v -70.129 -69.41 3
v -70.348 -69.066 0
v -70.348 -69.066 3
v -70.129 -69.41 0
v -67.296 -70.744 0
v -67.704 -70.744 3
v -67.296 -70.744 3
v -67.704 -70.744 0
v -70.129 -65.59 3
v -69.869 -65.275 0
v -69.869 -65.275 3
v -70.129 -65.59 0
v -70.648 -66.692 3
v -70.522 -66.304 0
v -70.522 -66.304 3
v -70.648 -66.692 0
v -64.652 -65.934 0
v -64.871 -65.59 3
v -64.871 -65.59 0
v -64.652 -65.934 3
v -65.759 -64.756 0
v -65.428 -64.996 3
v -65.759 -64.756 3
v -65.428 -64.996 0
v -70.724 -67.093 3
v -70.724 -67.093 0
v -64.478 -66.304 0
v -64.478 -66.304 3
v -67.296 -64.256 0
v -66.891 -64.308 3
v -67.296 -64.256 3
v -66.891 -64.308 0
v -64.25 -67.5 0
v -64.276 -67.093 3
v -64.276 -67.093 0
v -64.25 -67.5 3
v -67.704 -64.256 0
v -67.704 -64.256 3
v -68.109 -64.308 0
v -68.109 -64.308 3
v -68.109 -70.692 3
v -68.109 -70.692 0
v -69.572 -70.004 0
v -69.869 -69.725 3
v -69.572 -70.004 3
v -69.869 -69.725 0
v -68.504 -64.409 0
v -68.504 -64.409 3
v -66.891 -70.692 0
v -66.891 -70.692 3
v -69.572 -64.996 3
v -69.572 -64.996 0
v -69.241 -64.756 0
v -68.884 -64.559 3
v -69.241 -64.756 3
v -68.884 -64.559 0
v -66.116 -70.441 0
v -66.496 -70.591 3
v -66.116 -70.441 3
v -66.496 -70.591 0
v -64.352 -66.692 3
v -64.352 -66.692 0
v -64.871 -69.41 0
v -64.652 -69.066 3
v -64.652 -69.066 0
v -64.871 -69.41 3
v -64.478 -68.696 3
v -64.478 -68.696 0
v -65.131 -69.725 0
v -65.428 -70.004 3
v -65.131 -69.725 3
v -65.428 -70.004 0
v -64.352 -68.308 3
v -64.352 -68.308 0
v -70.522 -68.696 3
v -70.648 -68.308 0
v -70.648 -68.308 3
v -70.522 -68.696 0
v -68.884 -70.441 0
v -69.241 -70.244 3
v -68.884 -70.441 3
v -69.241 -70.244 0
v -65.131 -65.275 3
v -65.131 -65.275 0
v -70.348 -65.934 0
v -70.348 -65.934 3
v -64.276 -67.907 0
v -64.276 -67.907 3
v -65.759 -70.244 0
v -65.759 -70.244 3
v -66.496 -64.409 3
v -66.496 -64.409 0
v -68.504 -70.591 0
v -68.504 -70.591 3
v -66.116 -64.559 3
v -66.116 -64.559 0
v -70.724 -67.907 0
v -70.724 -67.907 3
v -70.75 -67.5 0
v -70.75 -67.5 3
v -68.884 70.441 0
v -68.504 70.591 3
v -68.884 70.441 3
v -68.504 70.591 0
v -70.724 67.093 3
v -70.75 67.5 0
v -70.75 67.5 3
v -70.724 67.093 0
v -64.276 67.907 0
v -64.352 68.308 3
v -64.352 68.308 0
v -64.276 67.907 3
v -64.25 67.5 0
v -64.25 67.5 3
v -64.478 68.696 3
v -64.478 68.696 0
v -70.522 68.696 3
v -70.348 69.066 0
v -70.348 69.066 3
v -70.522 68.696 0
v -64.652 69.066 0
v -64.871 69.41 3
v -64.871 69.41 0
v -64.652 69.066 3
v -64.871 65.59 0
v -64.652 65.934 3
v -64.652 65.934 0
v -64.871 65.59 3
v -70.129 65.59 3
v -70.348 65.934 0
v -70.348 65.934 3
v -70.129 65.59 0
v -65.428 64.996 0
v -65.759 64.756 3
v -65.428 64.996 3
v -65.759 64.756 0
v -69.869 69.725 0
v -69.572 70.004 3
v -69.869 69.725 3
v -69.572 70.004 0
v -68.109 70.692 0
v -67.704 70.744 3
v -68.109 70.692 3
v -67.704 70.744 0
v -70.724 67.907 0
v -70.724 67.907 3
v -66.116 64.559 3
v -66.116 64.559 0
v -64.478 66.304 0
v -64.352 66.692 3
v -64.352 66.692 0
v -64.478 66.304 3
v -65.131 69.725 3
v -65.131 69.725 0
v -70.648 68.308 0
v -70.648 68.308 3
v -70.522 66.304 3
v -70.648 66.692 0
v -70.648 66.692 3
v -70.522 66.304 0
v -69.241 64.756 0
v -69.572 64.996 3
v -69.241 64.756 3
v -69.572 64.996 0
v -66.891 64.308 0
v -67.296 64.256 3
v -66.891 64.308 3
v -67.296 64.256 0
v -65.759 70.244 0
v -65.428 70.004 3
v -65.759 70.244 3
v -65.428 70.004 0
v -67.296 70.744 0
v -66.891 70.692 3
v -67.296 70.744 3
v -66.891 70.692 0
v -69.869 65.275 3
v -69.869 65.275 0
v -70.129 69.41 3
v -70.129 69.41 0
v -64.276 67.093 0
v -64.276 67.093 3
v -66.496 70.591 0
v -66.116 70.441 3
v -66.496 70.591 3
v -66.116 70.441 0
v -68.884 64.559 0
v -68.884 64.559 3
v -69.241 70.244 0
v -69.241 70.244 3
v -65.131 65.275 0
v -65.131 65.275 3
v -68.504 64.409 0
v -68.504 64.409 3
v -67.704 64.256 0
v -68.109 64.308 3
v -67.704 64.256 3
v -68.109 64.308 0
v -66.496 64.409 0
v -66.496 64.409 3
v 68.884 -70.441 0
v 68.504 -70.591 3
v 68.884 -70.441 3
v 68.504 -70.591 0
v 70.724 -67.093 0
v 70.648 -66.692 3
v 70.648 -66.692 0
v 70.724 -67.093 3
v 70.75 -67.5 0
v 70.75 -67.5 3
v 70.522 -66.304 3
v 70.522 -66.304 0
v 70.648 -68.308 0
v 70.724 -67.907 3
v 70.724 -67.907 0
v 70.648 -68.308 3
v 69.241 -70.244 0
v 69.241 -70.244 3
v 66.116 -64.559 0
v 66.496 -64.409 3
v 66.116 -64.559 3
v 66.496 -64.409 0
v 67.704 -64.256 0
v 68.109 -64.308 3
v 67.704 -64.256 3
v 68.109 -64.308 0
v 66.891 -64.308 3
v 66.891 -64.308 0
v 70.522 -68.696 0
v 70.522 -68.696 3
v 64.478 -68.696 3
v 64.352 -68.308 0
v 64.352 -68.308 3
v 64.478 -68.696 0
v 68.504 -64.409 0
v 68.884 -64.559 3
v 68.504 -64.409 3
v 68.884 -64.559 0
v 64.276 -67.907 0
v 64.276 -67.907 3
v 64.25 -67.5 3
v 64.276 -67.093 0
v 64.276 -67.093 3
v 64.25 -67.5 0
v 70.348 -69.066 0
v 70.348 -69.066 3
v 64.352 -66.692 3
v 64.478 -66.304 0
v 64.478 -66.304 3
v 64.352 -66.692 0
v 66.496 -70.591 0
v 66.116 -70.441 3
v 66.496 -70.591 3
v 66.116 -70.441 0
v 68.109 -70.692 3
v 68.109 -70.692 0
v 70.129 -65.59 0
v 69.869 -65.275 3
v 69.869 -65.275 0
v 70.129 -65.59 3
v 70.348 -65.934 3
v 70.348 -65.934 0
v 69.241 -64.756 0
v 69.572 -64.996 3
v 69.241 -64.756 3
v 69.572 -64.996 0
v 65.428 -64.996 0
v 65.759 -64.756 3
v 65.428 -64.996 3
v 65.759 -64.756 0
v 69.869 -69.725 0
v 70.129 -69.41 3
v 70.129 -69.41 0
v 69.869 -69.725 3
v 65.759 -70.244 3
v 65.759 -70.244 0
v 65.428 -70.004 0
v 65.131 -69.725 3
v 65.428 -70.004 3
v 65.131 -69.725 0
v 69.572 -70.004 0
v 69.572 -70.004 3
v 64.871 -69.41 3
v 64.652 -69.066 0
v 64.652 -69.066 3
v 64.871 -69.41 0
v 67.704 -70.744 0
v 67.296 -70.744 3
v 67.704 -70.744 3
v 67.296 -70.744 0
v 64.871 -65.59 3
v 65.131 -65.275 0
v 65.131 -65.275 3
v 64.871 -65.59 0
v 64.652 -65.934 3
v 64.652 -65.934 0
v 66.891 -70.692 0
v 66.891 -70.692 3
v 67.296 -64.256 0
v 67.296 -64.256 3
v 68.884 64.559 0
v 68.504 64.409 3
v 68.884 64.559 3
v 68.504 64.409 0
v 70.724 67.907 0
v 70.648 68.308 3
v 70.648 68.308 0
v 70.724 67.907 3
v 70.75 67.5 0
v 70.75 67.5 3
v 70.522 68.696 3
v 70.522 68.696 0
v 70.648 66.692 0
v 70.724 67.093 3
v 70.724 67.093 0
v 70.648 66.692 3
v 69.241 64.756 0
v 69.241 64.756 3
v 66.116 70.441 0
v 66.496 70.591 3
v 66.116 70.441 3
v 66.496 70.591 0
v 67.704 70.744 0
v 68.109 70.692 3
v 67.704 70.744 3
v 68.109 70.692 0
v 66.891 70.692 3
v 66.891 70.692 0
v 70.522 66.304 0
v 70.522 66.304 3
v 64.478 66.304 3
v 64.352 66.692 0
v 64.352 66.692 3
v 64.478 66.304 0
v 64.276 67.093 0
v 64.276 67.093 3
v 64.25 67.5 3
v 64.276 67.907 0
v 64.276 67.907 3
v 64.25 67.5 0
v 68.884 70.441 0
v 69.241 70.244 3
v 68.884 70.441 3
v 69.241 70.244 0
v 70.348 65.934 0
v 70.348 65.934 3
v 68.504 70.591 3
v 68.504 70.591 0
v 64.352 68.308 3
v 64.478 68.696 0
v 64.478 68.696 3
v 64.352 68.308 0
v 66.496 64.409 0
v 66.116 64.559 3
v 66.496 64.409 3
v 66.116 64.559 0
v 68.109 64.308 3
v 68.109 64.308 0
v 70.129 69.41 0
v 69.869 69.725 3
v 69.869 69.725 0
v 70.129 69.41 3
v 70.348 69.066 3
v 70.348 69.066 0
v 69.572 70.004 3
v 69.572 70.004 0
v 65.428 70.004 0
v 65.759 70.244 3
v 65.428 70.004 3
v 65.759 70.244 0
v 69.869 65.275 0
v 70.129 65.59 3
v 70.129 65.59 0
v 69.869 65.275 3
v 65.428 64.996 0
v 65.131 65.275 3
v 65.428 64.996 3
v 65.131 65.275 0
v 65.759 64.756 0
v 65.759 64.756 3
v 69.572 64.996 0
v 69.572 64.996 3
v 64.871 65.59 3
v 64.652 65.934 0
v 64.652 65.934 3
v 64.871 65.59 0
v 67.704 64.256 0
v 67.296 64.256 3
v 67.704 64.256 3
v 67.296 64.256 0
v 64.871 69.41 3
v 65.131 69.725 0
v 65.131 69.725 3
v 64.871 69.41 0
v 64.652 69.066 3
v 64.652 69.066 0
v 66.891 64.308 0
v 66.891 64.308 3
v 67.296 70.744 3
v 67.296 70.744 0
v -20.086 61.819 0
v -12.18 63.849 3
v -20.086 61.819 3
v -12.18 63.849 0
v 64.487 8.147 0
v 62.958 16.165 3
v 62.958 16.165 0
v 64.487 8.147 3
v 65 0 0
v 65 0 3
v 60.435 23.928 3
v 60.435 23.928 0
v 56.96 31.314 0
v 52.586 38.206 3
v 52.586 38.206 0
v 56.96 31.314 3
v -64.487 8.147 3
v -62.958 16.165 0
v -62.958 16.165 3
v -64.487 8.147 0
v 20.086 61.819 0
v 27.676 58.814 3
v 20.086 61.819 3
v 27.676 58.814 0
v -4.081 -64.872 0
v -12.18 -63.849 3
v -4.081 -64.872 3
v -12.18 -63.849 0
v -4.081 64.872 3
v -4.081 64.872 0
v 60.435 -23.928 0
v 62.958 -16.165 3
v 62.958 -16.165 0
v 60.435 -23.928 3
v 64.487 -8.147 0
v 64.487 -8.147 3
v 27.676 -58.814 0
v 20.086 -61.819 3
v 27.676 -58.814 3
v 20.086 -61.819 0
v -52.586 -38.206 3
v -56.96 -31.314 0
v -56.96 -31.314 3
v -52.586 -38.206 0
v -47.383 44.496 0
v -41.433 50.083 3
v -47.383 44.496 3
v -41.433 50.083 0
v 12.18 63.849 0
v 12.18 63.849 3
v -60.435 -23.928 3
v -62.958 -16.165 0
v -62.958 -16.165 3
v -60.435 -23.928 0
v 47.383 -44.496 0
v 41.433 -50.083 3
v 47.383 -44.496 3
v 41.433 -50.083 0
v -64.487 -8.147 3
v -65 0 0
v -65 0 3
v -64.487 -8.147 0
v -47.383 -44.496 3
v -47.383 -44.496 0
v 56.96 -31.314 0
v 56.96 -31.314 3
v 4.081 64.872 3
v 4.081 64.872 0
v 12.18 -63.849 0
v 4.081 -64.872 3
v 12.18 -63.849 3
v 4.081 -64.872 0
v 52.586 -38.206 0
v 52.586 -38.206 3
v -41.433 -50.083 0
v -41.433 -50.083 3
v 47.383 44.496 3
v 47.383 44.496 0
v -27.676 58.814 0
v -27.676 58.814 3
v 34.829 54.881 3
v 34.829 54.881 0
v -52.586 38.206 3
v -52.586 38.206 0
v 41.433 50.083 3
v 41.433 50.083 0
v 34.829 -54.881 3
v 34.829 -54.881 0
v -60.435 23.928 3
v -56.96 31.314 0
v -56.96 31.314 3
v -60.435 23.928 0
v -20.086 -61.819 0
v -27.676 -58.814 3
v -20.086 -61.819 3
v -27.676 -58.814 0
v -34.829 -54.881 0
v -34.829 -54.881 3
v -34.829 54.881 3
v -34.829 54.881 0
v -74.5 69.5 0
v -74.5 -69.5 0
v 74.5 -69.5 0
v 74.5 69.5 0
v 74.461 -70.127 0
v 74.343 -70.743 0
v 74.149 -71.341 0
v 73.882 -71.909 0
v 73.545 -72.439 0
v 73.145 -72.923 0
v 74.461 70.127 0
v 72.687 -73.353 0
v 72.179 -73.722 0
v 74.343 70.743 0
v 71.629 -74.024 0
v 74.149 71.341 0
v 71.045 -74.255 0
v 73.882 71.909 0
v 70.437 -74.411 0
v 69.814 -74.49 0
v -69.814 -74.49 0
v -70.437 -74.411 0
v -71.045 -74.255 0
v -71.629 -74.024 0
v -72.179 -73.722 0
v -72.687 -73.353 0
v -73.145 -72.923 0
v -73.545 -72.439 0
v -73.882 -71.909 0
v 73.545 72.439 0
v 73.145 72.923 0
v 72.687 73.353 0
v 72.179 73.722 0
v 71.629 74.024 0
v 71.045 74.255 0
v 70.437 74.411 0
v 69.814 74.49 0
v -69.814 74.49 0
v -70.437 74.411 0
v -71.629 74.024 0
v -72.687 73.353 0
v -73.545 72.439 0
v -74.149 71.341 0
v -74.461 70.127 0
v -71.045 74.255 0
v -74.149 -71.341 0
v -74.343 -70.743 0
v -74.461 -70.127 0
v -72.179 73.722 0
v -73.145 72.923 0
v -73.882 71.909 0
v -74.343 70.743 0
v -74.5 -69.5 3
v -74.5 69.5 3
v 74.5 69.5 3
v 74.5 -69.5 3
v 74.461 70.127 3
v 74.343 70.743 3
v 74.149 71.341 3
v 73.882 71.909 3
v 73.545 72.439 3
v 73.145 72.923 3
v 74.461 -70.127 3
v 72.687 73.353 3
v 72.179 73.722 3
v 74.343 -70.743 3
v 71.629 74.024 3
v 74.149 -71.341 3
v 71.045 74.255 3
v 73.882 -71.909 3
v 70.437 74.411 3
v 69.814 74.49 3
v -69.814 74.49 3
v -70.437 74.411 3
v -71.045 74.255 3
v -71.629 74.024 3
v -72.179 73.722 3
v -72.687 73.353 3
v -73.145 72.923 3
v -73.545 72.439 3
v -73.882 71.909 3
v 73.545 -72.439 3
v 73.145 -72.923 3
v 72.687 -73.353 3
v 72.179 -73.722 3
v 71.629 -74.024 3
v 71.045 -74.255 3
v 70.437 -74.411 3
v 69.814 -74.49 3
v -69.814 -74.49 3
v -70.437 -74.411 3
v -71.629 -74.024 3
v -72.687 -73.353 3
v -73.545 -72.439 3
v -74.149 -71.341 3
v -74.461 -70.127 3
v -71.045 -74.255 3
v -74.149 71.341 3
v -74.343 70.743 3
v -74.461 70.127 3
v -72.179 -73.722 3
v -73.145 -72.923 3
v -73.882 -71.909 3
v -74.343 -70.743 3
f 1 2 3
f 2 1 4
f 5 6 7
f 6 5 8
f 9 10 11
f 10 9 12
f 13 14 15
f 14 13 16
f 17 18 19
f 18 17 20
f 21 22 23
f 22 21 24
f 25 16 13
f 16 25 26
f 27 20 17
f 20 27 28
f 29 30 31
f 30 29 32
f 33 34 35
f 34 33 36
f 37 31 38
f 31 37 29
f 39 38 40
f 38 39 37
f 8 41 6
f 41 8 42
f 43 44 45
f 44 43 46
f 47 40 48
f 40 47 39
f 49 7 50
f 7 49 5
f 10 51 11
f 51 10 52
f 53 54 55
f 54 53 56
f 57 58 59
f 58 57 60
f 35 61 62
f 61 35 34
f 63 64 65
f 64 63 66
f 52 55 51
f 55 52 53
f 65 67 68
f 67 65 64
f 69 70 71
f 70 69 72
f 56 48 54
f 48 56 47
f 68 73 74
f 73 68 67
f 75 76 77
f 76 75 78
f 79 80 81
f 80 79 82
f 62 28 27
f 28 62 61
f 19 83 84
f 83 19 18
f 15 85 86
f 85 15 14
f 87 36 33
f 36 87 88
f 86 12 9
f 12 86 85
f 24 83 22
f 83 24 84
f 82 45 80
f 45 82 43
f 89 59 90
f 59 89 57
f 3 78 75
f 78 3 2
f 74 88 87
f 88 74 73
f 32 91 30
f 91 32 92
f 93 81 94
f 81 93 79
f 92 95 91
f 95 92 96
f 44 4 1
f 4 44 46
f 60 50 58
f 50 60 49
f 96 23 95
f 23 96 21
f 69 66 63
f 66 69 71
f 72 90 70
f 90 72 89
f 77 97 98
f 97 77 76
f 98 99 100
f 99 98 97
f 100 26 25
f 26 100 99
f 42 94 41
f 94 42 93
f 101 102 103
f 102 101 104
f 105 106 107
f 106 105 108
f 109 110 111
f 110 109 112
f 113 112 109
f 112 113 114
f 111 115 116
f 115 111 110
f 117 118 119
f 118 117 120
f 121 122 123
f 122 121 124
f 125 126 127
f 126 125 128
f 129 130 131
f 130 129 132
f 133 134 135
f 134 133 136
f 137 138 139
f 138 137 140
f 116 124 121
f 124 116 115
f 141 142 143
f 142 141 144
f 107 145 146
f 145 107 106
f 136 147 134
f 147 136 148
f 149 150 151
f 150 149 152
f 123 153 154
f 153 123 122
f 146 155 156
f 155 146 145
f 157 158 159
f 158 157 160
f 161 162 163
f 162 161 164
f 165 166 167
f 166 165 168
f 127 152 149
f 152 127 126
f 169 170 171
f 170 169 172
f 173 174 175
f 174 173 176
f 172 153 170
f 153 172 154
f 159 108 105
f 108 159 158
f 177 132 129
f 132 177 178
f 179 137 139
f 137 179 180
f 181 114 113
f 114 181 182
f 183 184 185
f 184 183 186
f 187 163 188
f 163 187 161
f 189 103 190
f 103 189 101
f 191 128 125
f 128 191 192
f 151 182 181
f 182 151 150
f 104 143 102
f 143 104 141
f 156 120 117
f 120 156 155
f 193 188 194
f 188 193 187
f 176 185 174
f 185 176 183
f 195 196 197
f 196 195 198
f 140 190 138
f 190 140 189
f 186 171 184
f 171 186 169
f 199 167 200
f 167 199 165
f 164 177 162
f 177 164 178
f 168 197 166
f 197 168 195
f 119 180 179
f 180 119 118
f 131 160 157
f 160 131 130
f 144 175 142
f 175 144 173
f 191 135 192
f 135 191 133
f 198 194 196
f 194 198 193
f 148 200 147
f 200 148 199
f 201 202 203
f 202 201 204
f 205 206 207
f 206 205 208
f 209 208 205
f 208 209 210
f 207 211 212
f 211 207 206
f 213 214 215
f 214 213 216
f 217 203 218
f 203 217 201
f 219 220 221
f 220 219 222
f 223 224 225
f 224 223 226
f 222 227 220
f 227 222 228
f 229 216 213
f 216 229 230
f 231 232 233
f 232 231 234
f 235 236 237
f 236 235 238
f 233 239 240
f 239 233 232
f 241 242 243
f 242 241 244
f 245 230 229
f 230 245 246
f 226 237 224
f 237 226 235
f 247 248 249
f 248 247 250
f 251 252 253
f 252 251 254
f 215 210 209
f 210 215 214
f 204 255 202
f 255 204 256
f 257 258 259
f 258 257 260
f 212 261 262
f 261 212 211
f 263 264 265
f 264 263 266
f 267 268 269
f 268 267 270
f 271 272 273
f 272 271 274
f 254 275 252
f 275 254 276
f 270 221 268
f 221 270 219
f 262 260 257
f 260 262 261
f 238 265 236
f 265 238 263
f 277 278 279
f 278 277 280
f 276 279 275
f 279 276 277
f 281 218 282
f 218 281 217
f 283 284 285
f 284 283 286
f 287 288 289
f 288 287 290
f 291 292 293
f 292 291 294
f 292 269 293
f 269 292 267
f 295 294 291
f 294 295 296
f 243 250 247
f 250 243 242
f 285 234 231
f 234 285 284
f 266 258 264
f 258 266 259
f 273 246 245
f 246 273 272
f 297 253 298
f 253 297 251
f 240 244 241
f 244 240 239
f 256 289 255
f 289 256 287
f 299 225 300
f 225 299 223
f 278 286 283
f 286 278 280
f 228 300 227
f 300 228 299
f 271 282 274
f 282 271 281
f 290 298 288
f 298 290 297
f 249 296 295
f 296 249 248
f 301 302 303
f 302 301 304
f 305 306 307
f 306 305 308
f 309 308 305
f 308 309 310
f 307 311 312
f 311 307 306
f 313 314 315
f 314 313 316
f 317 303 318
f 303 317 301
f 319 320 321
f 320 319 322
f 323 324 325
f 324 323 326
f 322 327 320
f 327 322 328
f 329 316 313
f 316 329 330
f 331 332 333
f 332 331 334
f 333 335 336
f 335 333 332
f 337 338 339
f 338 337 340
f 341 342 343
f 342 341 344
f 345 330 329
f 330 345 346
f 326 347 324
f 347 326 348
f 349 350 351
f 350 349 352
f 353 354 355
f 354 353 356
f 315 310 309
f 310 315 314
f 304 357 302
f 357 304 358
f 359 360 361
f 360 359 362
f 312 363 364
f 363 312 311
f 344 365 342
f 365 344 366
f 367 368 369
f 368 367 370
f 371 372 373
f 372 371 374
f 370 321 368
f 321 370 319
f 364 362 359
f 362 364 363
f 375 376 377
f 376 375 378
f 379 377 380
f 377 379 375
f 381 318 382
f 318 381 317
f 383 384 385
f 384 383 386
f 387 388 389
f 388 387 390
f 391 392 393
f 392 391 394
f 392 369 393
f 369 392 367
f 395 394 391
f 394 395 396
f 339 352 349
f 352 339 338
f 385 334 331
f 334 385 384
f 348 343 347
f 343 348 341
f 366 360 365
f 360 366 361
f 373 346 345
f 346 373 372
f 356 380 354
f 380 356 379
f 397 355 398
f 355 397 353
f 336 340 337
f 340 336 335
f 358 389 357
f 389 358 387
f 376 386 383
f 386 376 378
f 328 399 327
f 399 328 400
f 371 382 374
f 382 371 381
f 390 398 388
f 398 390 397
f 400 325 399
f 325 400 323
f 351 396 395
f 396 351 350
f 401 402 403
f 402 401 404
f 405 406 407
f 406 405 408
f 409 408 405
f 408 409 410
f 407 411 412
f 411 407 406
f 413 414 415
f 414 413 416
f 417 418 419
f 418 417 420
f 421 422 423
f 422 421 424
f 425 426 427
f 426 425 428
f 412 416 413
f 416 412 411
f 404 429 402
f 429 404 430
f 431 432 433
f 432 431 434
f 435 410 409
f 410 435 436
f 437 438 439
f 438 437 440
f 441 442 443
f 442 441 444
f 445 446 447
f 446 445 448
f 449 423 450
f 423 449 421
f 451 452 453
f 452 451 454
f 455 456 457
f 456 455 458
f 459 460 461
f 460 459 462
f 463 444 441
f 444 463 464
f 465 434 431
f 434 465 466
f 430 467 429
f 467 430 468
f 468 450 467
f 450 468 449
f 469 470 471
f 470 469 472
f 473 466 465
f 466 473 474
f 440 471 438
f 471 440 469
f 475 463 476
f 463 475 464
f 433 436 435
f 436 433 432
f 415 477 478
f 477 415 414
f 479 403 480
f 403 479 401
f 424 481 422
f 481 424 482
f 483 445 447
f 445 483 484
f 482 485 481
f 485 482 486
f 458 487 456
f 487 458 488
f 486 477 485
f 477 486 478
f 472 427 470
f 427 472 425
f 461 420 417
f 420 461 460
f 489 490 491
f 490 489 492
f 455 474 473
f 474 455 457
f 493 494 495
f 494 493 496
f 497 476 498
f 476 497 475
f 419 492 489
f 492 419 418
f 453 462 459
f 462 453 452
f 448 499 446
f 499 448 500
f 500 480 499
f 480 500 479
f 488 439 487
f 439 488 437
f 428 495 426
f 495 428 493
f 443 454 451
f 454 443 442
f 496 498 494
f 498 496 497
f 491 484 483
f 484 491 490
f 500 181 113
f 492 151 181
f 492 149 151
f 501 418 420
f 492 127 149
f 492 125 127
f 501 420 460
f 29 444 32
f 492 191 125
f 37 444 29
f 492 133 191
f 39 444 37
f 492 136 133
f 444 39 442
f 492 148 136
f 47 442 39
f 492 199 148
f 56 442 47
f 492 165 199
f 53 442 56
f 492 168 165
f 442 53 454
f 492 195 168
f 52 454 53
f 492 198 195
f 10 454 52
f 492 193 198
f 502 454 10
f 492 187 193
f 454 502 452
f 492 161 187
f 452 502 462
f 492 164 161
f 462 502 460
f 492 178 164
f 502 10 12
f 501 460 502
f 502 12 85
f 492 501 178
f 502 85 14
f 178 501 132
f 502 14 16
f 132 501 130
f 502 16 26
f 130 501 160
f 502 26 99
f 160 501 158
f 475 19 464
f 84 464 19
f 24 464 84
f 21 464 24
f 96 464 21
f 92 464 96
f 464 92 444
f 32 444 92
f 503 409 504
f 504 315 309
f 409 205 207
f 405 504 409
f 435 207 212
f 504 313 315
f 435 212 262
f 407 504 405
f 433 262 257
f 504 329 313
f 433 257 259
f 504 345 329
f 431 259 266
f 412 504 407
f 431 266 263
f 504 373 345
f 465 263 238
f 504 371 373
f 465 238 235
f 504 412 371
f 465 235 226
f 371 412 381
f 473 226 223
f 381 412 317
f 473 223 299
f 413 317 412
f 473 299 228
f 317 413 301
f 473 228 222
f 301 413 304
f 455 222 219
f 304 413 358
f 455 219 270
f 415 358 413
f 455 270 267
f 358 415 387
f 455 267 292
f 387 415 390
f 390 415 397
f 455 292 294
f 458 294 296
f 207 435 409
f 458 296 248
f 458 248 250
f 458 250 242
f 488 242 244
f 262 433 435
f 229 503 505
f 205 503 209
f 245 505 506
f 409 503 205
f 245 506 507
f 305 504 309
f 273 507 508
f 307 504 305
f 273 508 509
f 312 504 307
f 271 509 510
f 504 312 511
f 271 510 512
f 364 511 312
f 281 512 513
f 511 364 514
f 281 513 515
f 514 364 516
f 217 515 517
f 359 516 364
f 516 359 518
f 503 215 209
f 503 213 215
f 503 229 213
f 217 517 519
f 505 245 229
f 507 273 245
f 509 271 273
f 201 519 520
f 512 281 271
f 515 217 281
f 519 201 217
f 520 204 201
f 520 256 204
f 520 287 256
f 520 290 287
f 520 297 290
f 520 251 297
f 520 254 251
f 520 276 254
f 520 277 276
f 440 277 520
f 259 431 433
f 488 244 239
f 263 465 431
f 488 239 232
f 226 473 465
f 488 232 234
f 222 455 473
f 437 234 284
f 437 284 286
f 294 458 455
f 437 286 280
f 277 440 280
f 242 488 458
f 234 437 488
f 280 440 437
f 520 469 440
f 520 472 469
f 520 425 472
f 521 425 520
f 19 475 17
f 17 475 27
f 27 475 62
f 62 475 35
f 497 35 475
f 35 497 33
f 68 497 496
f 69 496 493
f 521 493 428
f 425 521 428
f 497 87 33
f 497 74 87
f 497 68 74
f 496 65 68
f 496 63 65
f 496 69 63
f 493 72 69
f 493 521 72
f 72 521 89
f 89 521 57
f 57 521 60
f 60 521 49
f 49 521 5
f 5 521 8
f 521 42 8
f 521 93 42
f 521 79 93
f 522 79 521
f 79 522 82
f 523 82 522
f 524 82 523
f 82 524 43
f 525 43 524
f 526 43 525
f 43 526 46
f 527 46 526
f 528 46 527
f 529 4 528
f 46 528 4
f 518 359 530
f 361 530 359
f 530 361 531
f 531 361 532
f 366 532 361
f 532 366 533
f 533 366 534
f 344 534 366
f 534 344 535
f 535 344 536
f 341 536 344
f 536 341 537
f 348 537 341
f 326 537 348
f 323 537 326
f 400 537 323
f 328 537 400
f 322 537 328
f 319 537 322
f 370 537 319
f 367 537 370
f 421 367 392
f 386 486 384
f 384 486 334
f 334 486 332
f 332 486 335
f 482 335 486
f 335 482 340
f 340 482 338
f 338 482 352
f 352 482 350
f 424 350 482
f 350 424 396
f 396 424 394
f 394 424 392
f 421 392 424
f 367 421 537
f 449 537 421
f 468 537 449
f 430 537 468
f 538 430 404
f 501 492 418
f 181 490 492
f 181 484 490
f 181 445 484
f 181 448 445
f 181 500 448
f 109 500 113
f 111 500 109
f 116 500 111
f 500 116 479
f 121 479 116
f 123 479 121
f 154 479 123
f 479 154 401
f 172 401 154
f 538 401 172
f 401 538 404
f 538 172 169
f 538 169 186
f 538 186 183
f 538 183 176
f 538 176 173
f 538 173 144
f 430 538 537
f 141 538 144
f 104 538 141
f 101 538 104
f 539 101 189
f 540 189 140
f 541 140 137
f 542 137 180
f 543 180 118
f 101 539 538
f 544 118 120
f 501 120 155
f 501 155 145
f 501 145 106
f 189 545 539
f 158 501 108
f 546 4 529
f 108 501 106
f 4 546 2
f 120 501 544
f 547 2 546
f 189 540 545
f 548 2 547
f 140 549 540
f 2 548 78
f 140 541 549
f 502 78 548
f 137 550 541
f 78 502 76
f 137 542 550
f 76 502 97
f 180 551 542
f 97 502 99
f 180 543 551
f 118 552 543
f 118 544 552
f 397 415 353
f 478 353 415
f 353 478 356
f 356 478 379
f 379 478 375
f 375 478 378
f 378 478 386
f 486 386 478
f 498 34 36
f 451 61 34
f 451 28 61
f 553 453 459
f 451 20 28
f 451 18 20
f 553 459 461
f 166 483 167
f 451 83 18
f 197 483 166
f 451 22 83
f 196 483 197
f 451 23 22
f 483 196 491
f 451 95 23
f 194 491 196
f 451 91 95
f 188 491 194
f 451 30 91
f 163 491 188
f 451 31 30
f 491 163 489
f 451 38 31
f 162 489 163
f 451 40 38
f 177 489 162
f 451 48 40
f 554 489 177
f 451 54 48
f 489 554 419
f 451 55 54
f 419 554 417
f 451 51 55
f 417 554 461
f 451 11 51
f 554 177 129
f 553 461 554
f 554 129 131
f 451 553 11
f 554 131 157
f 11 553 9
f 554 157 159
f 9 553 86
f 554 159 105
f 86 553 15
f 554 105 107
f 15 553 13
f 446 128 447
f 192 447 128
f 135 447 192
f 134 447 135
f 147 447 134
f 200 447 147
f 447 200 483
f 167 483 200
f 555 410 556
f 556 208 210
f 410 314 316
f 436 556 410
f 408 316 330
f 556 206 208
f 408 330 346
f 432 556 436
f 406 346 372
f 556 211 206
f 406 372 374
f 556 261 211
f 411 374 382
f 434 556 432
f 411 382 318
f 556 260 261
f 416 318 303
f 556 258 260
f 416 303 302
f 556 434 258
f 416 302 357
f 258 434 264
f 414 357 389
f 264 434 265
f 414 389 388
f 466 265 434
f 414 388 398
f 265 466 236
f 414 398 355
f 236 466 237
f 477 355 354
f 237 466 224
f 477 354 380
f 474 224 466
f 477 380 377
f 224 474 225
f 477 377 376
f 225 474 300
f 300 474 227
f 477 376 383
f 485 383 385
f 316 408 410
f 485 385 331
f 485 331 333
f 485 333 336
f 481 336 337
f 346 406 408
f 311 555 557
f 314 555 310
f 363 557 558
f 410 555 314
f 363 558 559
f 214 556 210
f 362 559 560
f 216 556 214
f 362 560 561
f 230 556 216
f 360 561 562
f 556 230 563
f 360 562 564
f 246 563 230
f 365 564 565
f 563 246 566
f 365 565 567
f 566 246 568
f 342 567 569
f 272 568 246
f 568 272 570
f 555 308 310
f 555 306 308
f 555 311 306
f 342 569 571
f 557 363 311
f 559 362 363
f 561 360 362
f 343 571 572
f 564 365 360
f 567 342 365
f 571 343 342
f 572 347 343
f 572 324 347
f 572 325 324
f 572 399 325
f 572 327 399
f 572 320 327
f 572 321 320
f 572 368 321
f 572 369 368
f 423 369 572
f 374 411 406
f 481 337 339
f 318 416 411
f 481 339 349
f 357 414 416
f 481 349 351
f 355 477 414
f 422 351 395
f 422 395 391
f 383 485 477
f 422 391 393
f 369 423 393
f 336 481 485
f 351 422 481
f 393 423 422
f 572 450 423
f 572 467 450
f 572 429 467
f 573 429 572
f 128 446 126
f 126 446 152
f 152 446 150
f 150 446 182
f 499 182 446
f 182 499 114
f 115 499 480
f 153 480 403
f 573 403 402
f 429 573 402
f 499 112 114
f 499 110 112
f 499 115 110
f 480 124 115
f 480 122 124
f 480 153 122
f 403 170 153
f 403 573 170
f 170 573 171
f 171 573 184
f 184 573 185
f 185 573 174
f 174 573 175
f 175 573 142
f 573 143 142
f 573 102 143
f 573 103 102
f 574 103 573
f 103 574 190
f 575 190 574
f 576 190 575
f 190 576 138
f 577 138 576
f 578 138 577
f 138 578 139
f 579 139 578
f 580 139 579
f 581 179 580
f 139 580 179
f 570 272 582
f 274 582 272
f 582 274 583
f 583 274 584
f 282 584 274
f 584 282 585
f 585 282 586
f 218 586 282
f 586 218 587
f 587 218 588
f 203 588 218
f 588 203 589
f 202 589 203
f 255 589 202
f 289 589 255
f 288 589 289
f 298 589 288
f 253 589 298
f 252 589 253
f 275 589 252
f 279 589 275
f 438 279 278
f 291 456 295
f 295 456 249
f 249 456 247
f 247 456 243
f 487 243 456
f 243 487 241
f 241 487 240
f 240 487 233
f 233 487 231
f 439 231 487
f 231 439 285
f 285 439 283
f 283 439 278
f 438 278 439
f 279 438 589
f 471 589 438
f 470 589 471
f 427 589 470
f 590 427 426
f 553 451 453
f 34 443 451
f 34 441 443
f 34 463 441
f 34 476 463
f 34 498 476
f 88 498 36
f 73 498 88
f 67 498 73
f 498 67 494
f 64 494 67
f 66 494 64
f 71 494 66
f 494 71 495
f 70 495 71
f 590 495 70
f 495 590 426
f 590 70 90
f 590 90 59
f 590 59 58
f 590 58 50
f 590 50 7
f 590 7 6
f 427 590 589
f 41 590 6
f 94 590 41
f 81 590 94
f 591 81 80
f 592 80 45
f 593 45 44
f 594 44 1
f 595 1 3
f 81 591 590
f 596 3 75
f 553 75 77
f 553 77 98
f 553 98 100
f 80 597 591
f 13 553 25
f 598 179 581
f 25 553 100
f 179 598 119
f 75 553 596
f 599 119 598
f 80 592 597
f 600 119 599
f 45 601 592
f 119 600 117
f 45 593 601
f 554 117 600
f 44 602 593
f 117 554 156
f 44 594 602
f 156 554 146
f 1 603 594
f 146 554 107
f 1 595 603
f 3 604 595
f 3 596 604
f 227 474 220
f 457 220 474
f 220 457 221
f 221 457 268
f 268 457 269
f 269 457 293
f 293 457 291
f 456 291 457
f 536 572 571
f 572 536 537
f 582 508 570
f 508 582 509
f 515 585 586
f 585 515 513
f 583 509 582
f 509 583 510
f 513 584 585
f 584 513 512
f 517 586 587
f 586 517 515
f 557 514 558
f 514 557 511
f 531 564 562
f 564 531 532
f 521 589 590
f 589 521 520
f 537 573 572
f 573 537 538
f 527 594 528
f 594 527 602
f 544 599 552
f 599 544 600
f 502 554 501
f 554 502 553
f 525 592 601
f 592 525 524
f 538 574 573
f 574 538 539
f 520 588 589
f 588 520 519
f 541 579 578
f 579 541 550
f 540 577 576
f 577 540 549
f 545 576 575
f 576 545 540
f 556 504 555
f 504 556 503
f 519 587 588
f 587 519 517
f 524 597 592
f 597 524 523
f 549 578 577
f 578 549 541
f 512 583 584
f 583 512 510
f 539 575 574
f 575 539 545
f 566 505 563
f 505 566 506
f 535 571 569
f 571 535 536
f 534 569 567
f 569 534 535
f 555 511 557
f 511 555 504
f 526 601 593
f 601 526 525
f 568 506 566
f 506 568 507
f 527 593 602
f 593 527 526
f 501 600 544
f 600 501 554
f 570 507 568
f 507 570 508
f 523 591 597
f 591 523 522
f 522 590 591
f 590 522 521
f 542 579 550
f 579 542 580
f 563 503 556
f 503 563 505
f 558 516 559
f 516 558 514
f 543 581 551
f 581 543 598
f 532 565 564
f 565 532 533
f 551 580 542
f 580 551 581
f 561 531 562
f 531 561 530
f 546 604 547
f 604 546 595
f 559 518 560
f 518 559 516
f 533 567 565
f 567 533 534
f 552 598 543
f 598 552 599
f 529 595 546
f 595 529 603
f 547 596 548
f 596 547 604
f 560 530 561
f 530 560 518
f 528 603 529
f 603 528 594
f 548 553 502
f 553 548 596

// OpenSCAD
$fn = 50;


difference() {
	union() {
		hull() {
			translate(v = [-69.5000000000, 69.5000000000, 0]) {
				cylinder(h = 3, r = 5);
			}
			translate(v = [69.5000000000, 69.5000000000, 0]) {
				cylinder(h = 3, r = 5);
			}
			translate(v = [-69.5000000000, -69.5000000000, 0]) {
				cylinder(h = 3, r = 5);
			}
			translate(v = [69.5000000000, -69.5000000000, 0]) {
				cylinder(h = 3, r = 5);
			}
		}
	}
	union() {
		#translate(v = [-67.5000000000, -67.5000000000, -100.0000000000]) {
			cylinder(h = 200, r = 3.2500000000);
		}
		#translate(v = [-67.5000000000, 67.5000000000, -100.0000000000]) {
			cylinder(h = 200, r = 3.2500000000);
		}
		#translate(v = [67.5000000000, -67.5000000000, -100.0000000000]) {
			cylinder(h = 200, r = 3.2500000000);
		}
		#translate(v = [67.5000000000, 67.5000000000, -100.0000000000]) {
			cylinder(h = 200, r = 3.2500000000);
		}
		#cylinder(h = 3, r = 65.0000000000);
	}
}
